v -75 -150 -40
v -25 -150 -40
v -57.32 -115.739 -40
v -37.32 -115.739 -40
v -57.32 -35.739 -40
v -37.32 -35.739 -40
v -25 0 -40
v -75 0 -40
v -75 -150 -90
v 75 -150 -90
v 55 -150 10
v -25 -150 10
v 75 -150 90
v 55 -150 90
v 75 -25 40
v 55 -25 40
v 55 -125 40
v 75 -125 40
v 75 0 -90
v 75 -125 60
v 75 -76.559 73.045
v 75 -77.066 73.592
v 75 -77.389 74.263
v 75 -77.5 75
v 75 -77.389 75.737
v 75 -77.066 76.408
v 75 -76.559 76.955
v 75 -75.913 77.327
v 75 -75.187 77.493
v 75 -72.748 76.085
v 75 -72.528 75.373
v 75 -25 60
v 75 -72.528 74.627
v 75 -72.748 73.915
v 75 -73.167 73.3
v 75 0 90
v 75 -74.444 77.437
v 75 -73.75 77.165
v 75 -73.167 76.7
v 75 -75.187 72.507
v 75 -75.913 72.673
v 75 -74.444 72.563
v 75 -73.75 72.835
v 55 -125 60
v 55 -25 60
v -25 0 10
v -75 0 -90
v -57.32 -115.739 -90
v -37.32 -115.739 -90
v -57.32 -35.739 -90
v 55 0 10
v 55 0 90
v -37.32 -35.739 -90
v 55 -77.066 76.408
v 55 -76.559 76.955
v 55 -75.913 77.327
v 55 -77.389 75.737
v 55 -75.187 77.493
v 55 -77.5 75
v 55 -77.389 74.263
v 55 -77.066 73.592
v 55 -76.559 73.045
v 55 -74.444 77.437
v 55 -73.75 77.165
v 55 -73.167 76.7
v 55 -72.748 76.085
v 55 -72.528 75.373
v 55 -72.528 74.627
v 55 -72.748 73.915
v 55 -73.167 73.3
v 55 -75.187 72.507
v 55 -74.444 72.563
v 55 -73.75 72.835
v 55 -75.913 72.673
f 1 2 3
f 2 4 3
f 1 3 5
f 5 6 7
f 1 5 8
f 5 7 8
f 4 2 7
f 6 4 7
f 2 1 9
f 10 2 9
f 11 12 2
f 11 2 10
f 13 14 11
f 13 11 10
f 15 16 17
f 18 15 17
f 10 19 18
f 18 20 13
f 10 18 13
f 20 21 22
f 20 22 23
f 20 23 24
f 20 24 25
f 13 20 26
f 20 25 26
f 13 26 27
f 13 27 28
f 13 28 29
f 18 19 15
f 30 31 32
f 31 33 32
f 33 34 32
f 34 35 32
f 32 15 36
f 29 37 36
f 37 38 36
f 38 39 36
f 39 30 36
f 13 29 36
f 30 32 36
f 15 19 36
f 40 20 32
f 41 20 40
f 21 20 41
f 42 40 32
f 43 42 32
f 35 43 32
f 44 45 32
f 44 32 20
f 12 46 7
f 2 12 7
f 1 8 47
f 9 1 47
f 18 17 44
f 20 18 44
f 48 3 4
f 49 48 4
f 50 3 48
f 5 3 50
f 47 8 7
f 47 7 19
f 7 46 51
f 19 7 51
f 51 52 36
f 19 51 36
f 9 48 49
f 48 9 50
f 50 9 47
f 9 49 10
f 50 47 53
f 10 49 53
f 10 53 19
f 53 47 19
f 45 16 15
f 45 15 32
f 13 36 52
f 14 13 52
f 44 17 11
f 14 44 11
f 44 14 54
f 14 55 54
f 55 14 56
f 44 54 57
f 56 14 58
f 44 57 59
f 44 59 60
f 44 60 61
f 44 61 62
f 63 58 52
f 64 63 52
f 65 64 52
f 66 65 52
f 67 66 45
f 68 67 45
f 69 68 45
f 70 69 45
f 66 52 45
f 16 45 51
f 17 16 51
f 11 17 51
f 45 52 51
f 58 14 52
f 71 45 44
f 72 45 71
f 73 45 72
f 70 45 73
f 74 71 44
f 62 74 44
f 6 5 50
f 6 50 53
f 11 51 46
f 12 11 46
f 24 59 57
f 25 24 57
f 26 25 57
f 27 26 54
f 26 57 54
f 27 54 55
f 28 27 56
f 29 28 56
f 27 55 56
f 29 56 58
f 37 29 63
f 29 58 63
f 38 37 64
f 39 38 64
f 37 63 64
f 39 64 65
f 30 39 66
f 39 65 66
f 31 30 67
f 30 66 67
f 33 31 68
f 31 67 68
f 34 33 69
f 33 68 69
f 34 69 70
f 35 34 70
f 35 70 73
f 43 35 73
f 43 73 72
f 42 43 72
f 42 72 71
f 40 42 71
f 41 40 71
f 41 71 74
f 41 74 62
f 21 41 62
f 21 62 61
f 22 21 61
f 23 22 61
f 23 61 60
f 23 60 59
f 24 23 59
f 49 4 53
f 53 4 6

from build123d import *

# Parameters (mm, degrees)
F1_DEPTH = 150
F2_W     = 100
F2_H     = 20
F3_DEPTH = 20.001
F4_R     = 2.5
F5_DEPTH = 20.001
F6_W     = 20
F6_H     = 80
F7_DEPTH = 25.4
F8_W     = 20
F8_H     = 80
F9_DEPTH = 75.401


with BuildPart() as f1:
    # F0 (on Front) → F1 (new body)
    with BuildSketch(Plane.XZ):
        Polygon((75, -90), (75, 90), (55, 90), (55, 10), (-25, 10), (-25, -40), (-75, -40), (-75, -90), align=None)
    extrude(amount=F1_DEPTH)

    # F2 (on face) → F3 (cut, through all)
    with BuildSketch(Plane(origin=(55, 0, 0), x_dir=(0, -1, 0), z_dir=(-1, 0, 0))):
        with Locations((75, 50)):
            Rectangle(F2_W, F2_H)
    extrude(amount=-F3_DEPTH, mode=Mode.SUBTRACT)

    # F4 (on face) → F5 (cut, through all)
    with BuildSketch(Plane(origin=(55, 0, 0), x_dir=(0, -1, 0), z_dir=(-1, 0, 0))):
        with Locations((75, 75)):
            Circle(F4_R)
    extrude(amount=-F5_DEPTH, mode=Mode.SUBTRACT)

    # F6 (on face) → F7 (join)
    with BuildSketch(Plane.XY.offset(-40)):
        with Locations((-47.3200663872, -75.7392449304)):
            Rectangle(F6_W, F6_H)
    extrude(amount=F7_DEPTH)

    # F8 (on face) → F9 (cut, through all)
    with BuildSketch(Plane.XY.offset(-14.6)):
        with Locations((-47.3200663872, -75.7392449304)):
            Rectangle(F8_W, F8_H)
    extrude(amount=-F9_DEPTH, mode=Mode.SUBTRACT)


solid = f1.part
